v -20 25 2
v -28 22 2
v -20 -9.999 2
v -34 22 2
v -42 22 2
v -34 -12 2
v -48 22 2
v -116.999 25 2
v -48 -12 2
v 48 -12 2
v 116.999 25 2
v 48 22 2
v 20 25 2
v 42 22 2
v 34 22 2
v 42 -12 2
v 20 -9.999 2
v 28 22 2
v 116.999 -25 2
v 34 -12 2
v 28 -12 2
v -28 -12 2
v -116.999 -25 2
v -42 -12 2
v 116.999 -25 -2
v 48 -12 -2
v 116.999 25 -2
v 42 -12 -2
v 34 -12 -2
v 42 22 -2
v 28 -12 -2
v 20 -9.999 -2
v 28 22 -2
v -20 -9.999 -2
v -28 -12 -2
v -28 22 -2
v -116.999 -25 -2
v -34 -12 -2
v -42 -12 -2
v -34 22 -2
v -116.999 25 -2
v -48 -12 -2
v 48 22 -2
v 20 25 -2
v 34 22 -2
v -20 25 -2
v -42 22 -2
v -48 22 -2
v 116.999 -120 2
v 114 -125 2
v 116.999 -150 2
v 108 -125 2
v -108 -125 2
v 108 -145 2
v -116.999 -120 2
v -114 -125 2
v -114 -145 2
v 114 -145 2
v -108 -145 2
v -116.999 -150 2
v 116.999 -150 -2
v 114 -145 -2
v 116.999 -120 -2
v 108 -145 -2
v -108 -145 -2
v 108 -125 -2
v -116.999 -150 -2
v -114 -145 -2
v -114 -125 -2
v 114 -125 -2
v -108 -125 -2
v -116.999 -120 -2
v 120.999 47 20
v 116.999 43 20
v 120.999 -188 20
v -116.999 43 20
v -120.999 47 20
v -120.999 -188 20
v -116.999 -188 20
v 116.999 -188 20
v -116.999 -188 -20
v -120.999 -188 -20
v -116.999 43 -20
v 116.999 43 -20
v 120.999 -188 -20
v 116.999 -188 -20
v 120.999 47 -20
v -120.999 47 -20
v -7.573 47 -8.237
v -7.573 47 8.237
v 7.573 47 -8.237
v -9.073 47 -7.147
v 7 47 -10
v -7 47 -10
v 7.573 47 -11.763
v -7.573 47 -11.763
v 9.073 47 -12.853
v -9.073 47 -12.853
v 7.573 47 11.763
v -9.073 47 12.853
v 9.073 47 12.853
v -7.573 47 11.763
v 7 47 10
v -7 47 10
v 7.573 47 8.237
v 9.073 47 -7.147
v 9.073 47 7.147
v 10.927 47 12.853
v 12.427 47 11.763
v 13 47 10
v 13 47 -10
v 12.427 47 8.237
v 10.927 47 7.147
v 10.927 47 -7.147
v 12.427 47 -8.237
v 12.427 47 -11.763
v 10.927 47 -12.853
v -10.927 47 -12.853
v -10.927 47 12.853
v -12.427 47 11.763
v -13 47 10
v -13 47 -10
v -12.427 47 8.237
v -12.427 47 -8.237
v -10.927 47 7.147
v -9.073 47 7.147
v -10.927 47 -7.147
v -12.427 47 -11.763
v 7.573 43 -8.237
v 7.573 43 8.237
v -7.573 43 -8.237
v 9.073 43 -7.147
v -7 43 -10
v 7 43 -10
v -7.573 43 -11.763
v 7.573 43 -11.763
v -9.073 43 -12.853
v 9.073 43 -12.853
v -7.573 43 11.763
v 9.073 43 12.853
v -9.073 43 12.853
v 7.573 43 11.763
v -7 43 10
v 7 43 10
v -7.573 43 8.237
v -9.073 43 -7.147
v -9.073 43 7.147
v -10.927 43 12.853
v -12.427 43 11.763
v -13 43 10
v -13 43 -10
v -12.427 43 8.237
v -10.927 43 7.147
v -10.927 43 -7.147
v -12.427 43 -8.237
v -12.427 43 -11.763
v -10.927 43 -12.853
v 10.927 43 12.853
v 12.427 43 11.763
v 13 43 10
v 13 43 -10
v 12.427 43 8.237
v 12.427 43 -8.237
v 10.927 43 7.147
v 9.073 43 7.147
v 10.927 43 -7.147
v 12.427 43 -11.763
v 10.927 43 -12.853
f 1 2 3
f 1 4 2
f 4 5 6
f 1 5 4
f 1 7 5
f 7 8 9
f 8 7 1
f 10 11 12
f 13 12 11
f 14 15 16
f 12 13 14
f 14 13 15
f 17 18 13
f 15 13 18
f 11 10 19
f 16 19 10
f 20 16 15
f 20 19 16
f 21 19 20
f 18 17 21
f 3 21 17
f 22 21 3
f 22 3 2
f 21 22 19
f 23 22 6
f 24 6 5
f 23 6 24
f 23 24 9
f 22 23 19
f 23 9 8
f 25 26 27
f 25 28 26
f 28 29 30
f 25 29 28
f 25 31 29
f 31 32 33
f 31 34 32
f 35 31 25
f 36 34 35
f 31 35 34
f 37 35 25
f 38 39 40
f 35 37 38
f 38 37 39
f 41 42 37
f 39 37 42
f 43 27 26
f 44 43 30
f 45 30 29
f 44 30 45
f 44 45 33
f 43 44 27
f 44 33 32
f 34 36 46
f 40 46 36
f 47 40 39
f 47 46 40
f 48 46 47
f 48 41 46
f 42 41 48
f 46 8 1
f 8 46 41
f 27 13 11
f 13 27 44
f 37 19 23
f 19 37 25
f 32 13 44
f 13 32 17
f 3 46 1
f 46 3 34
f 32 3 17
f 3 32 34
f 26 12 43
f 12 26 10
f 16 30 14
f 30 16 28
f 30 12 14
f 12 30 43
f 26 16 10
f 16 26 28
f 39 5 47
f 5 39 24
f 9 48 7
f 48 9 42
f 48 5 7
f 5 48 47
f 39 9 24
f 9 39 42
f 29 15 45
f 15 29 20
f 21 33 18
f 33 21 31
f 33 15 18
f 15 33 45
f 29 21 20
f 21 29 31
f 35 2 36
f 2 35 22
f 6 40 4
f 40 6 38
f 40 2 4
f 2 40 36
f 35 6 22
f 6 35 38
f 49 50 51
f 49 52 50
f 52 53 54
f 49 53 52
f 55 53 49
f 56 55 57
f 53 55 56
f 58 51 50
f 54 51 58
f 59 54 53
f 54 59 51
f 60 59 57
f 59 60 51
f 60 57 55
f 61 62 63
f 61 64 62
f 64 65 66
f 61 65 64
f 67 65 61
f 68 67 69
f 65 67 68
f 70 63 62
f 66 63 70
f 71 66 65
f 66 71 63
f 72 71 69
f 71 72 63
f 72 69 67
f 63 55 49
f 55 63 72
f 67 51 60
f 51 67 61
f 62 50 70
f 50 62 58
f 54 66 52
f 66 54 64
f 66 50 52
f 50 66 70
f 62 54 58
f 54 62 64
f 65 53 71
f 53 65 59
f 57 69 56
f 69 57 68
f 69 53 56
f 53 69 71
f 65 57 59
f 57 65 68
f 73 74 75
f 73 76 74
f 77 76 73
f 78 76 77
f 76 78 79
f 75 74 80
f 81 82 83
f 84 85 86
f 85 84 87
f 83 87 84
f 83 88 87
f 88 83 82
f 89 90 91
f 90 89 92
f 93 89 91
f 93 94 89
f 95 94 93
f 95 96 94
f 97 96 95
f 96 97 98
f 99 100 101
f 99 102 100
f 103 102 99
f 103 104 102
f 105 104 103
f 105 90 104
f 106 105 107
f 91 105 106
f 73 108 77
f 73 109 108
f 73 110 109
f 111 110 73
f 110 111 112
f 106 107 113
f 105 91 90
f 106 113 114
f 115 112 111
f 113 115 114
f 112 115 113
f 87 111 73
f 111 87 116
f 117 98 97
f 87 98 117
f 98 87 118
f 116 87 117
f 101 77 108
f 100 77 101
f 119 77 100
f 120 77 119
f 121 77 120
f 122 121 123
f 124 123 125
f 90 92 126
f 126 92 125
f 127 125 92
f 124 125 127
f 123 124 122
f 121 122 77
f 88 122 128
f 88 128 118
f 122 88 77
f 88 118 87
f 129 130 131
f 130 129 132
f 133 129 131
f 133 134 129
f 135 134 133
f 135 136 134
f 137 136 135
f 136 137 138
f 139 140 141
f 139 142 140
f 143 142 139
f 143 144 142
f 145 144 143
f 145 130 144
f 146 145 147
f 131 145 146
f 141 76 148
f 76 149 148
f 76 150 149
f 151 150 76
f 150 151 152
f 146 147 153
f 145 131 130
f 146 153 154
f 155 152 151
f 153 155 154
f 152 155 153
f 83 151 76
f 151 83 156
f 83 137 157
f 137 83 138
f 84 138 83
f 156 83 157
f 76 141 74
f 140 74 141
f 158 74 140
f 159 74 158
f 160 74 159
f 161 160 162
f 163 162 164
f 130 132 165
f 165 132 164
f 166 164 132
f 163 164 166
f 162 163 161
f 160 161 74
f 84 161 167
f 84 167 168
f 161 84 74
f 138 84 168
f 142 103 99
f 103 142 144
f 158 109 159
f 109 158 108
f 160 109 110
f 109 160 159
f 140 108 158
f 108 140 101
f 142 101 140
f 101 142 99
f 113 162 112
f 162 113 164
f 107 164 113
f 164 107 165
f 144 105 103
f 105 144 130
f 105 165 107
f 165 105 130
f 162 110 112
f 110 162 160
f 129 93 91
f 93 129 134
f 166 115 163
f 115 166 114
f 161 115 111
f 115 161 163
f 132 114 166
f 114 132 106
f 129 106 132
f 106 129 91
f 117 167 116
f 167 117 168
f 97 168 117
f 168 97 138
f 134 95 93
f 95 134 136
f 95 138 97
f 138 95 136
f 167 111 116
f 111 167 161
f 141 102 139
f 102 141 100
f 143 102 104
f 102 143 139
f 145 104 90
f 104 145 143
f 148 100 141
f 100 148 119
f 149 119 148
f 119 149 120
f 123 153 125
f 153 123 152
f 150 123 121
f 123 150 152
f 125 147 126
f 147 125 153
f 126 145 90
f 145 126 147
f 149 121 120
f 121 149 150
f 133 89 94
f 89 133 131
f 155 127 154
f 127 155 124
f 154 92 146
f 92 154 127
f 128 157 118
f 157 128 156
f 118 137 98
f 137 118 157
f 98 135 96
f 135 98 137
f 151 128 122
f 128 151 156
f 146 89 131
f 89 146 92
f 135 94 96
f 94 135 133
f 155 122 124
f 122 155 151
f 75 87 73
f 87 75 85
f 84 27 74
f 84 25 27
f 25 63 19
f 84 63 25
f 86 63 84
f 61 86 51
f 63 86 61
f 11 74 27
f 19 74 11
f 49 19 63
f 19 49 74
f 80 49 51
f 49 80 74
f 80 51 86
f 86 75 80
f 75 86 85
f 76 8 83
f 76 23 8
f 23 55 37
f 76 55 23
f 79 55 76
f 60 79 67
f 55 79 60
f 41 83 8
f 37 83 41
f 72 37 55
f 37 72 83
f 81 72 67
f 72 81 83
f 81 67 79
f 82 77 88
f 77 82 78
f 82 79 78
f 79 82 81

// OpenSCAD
//leave some space between antenna to the frame
margin = 10;
//dimension of the base attached to antenna
x_base = 228+margin;
y_base = 50;
z_base = 4;
//dimension of the gap on the base
x_gap = 40;
y_gap = 35;
z_gap = 5;
//dimension of the stands
x_stand = 4;
y_stand = 235;
z_stand = 40;
//radius of holes on the base
r_hole = 3;

//distance from the centers of holes to the border of base in +Y direction
d_b_1 = 6;
d_b_2 = 32;

//distance from the centers of holes to the border of base in +X direction
d_g_1 = 69+margin/2;
d_g_2 = 83+margin/2;

difference(){
    //create the base
    difference() {
    cube([x_base,y_base,z_base],center=true);
    translate([0,(y_base-y_gap)/2+0.001,0])
        cube([x_gap,y_gap,z_gap],center=true);
    }
    
    //8 holes on the base
//    translate([x_base/2-d_g_1,y_base/2-d_b_1,0])
//        cylinder(h=10,r=r_hole,center=true);
//    translate([-(x_base/2-d_g_1),y_base/2-d_b_1,0])
//        cylinder(h=10,r=r_hole,center=true);
//    translate([x_base/2-d_g_1,y_base/2-d_b_2,0])
//        cylinder(h=10,r=r_hole,center=true);
//    translate([-(x_base/2-d_g_1),y_base/2-d_b_2,0])
//        cylinder(h=10,r=r_hole,center=true);
    
    translate([x_base/2-d_g_1,y_base/2-20,0])
        cube([r_hole*2,34,10],center=true);
    translate([-(x_base/2-d_g_1),y_base/2-20,0])
        cube([r_hole*2,34,10],center=true);
    
//    translate([x_base/2-d_g_2,y_base/2-d_b_1,0])
//        cylinder(h=10,r=r_hole,center=true);
//    translate([-(x_base/2-d_g_2),y_base/2-d_b_1,0])
//        cylinder(h=10,r=r_hole,center=true);
//    translate([x_base/2-d_g_2,y_base/2-d_b_2,0])
//        cylinder(h=10,r=r_hole,center=true);
//    translate([-(x_base/2-d_g_2),y_base/2-d_b_2,0])
//        cylinder(h=10,r=r_hole,center=true);
        
    translate([x_base/2-d_g_2,y_base/2-20,0])
        cube([r_hole*2,34,10],center=true);
    translate([-(x_base/2-d_g_2),y_base/2-20,0])
        cube([r_hole*2,34,10],center=true);
}
translate([0,-160+25,0])
difference(){
    cube([x_base,30,z_base],center=true);
    translate([x_base/2-8,0,0])
        cube([r_hole*2,20,10],center=true);
    translate([-x_base/2+8,0,0])
        cube([r_hole*2,20,10],center=true);
}

//the top frame
toBaseCenter = 20;
translate([0,y_base/2+toBaseCenter,0])
difference(){
    cube([x_base,z_base,z_stand],center=true);
    translate([10,0,10])
    rotate([90,0,0])
        cylinder(h=10,r=r_hole,center=true);
    translate([10,0,-10])
    rotate([90,0,0])
        cylinder(h=10,r=r_hole,center=true);
    translate([-10,0,10])
    rotate([90,0,0])
        cylinder(h=10,r=r_hole,center=true);
    translate([-10,0,-10])
    rotate([90,0,0])
        cylinder(h=10,r=r_hole,center=true);
}

//the stand on left
translate([x_base/2 - 0.001,(y_base/2+toBaseCenter)-y_stand/2+z_base/2,0])
//translate([x_base/2 - 0.001,(y_base/2+shift)-y_stand/2+z_base/2,0])
    cube([x_stand,y_stand,z_stand],center=true);

//the stand on right
translate([-x_base/2 + 0.001,(y_base/2+toBaseCenter)-y_stand/2+z_base/2,0])
    cube([x_stand,y_stand,z_stand],center=true);
